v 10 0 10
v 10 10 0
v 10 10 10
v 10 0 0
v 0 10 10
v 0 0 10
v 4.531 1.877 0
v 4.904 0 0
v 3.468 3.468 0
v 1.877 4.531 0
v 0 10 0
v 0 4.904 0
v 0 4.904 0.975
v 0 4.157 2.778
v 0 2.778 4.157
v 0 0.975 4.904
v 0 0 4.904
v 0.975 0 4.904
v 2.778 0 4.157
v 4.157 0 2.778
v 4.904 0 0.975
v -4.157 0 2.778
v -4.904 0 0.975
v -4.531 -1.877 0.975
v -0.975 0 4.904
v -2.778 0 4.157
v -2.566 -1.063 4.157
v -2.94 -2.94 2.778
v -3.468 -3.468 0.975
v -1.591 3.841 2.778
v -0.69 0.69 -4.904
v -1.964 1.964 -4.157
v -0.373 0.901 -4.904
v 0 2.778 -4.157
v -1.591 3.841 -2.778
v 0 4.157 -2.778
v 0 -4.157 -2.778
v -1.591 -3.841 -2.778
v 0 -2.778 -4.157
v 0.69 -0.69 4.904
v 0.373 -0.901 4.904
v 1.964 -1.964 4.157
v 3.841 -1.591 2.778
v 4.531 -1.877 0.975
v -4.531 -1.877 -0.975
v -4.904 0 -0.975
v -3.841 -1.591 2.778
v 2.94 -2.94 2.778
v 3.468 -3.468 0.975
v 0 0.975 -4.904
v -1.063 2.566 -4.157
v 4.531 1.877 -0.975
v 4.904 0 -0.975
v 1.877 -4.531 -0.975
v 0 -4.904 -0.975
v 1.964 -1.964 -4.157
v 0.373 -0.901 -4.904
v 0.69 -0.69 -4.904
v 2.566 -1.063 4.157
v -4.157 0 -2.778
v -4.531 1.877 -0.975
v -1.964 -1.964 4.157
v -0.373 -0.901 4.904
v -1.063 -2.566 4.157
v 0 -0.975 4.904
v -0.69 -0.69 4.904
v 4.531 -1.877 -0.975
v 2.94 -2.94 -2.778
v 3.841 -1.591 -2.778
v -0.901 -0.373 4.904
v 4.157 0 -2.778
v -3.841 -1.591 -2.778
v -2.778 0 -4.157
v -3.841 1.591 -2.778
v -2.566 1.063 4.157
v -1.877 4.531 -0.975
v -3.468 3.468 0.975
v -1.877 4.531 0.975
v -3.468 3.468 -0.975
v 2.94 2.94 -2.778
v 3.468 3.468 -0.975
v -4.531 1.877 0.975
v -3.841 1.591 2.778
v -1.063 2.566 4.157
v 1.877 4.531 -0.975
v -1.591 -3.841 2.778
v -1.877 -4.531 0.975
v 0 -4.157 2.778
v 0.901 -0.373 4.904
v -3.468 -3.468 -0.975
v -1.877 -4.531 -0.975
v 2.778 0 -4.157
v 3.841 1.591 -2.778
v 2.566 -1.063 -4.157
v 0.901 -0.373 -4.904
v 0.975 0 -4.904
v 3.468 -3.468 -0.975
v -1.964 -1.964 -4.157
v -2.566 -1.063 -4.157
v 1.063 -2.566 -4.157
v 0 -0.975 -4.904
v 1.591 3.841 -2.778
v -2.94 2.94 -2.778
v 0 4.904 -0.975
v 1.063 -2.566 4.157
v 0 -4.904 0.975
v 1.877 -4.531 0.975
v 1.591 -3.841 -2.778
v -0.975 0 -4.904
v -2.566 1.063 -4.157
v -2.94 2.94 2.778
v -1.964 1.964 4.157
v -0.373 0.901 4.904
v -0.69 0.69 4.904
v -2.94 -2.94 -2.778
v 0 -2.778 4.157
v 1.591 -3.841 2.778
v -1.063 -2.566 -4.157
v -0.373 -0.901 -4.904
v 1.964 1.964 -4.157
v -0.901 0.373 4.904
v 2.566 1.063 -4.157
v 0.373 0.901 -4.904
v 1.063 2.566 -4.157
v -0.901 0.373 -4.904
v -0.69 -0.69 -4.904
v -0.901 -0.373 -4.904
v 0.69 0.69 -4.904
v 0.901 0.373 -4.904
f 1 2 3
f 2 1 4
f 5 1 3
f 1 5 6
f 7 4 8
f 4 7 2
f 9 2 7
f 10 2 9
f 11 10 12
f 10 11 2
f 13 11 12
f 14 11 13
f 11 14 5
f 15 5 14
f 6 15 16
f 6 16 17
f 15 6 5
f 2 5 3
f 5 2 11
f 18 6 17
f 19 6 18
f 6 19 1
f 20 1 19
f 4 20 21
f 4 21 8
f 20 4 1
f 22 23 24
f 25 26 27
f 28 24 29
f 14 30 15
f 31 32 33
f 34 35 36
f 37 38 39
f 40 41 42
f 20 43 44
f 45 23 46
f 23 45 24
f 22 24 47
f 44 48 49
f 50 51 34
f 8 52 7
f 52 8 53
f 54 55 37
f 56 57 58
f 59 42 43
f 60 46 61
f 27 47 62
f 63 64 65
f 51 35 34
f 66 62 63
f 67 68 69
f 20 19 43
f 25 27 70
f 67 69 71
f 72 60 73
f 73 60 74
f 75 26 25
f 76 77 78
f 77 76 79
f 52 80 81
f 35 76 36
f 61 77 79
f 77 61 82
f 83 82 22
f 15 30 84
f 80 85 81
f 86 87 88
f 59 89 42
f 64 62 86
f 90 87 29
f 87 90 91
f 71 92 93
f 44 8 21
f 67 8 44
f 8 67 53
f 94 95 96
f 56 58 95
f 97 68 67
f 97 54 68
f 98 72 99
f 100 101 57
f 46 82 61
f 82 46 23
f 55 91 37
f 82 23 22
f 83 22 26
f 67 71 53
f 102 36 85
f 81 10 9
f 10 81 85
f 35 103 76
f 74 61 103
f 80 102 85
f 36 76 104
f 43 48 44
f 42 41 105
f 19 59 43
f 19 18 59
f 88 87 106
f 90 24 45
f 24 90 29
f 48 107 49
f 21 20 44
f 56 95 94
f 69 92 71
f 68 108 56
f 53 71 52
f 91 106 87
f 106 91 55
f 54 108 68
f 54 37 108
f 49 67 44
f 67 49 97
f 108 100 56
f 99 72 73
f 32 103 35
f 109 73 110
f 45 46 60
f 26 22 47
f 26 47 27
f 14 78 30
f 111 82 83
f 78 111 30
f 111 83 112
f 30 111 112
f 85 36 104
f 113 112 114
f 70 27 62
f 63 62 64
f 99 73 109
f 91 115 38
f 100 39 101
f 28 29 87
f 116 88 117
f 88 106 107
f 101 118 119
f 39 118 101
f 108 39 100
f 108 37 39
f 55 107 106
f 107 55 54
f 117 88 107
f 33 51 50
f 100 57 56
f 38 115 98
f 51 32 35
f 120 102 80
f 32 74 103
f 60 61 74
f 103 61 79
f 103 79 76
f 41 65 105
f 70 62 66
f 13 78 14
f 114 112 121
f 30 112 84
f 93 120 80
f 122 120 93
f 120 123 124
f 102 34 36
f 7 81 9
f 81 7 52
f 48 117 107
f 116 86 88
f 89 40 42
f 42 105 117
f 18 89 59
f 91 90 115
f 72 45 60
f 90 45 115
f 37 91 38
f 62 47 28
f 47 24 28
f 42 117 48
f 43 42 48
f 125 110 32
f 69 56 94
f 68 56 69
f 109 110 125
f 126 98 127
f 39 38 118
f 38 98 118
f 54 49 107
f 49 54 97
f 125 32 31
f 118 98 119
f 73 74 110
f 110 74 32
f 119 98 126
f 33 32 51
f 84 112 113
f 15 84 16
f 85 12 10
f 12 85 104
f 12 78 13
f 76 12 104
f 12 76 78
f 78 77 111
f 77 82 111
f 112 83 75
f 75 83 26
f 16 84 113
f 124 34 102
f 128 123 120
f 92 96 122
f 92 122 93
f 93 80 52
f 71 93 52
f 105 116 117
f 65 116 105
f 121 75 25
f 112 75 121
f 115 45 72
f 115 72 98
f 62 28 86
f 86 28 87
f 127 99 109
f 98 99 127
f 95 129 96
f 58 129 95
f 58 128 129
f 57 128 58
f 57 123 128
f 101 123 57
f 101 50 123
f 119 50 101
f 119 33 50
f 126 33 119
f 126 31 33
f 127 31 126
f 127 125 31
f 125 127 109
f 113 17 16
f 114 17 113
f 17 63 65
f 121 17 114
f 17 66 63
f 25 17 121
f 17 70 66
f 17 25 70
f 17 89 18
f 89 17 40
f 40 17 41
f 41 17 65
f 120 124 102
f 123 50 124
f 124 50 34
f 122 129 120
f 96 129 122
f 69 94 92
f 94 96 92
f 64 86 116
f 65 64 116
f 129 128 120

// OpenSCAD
// This is a single-line comment
cube([10, 10, 10]); // inline comment
/* Multi-line
   comment block */
sphere(r = 5);
